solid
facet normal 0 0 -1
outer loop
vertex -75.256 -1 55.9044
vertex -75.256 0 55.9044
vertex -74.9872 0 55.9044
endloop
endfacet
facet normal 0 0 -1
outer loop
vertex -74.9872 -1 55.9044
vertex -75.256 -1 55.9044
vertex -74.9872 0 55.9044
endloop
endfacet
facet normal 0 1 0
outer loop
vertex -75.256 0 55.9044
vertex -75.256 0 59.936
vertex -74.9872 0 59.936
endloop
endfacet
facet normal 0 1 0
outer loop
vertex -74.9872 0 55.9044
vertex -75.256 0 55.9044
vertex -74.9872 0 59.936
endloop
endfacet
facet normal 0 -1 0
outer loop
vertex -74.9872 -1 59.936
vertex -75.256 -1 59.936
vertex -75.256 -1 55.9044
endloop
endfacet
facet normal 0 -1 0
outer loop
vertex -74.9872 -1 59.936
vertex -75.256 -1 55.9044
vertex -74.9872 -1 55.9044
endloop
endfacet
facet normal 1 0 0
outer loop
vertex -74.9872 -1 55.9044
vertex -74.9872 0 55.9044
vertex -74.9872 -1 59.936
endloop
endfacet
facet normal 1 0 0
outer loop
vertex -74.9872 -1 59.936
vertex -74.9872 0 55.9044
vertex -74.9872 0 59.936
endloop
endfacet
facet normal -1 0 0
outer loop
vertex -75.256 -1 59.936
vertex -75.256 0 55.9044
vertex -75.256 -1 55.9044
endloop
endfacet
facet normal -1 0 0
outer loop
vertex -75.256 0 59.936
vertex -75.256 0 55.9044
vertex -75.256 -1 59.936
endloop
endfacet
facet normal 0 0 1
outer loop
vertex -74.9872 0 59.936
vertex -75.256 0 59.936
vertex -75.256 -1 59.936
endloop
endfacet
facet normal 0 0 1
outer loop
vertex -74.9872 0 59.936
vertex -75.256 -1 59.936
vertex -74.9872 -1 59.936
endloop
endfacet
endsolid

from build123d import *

# Parameters (mm, degrees)
F0_W     = 0.2687722445
F0_H     = 4.0315650403
F1_DEPTH = 1
F0_W_2   = 74.9872028828
F0_H_2   = 55.9044405818
F2_DEPTH = 74.5


with BuildPart() as f1:
    # F0 (on Front) → F1 (new body)
    with BuildSketch(Plane.XZ):
        with Locations((-75.121589005, 57.920223102)):
            Rectangle(F0_W, F0_H)
    extrude(amount=F1_DEPTH)


with BuildPart() as f1b:
    # F0 (on Front) → F1, piece 2 (new body)
    with BuildSketch(Plane.XZ):
        with Locations((-37.4936014414, 27.9522202909)):
            Rectangle(F0_W_2, F0_H_2)
    extrude(amount=F1_DEPTH)

    # F2 (cut): a face of the model
    f2_faces = [f1b.faces().sort_by_distance(p)[0] for p in [
        (-37.4936014414, 0, 27.9522202909),
    ]]
    extrude(f2_faces, amount=-F2_DEPTH, mode=Mode.SUBTRACT)


solid = f1.part
